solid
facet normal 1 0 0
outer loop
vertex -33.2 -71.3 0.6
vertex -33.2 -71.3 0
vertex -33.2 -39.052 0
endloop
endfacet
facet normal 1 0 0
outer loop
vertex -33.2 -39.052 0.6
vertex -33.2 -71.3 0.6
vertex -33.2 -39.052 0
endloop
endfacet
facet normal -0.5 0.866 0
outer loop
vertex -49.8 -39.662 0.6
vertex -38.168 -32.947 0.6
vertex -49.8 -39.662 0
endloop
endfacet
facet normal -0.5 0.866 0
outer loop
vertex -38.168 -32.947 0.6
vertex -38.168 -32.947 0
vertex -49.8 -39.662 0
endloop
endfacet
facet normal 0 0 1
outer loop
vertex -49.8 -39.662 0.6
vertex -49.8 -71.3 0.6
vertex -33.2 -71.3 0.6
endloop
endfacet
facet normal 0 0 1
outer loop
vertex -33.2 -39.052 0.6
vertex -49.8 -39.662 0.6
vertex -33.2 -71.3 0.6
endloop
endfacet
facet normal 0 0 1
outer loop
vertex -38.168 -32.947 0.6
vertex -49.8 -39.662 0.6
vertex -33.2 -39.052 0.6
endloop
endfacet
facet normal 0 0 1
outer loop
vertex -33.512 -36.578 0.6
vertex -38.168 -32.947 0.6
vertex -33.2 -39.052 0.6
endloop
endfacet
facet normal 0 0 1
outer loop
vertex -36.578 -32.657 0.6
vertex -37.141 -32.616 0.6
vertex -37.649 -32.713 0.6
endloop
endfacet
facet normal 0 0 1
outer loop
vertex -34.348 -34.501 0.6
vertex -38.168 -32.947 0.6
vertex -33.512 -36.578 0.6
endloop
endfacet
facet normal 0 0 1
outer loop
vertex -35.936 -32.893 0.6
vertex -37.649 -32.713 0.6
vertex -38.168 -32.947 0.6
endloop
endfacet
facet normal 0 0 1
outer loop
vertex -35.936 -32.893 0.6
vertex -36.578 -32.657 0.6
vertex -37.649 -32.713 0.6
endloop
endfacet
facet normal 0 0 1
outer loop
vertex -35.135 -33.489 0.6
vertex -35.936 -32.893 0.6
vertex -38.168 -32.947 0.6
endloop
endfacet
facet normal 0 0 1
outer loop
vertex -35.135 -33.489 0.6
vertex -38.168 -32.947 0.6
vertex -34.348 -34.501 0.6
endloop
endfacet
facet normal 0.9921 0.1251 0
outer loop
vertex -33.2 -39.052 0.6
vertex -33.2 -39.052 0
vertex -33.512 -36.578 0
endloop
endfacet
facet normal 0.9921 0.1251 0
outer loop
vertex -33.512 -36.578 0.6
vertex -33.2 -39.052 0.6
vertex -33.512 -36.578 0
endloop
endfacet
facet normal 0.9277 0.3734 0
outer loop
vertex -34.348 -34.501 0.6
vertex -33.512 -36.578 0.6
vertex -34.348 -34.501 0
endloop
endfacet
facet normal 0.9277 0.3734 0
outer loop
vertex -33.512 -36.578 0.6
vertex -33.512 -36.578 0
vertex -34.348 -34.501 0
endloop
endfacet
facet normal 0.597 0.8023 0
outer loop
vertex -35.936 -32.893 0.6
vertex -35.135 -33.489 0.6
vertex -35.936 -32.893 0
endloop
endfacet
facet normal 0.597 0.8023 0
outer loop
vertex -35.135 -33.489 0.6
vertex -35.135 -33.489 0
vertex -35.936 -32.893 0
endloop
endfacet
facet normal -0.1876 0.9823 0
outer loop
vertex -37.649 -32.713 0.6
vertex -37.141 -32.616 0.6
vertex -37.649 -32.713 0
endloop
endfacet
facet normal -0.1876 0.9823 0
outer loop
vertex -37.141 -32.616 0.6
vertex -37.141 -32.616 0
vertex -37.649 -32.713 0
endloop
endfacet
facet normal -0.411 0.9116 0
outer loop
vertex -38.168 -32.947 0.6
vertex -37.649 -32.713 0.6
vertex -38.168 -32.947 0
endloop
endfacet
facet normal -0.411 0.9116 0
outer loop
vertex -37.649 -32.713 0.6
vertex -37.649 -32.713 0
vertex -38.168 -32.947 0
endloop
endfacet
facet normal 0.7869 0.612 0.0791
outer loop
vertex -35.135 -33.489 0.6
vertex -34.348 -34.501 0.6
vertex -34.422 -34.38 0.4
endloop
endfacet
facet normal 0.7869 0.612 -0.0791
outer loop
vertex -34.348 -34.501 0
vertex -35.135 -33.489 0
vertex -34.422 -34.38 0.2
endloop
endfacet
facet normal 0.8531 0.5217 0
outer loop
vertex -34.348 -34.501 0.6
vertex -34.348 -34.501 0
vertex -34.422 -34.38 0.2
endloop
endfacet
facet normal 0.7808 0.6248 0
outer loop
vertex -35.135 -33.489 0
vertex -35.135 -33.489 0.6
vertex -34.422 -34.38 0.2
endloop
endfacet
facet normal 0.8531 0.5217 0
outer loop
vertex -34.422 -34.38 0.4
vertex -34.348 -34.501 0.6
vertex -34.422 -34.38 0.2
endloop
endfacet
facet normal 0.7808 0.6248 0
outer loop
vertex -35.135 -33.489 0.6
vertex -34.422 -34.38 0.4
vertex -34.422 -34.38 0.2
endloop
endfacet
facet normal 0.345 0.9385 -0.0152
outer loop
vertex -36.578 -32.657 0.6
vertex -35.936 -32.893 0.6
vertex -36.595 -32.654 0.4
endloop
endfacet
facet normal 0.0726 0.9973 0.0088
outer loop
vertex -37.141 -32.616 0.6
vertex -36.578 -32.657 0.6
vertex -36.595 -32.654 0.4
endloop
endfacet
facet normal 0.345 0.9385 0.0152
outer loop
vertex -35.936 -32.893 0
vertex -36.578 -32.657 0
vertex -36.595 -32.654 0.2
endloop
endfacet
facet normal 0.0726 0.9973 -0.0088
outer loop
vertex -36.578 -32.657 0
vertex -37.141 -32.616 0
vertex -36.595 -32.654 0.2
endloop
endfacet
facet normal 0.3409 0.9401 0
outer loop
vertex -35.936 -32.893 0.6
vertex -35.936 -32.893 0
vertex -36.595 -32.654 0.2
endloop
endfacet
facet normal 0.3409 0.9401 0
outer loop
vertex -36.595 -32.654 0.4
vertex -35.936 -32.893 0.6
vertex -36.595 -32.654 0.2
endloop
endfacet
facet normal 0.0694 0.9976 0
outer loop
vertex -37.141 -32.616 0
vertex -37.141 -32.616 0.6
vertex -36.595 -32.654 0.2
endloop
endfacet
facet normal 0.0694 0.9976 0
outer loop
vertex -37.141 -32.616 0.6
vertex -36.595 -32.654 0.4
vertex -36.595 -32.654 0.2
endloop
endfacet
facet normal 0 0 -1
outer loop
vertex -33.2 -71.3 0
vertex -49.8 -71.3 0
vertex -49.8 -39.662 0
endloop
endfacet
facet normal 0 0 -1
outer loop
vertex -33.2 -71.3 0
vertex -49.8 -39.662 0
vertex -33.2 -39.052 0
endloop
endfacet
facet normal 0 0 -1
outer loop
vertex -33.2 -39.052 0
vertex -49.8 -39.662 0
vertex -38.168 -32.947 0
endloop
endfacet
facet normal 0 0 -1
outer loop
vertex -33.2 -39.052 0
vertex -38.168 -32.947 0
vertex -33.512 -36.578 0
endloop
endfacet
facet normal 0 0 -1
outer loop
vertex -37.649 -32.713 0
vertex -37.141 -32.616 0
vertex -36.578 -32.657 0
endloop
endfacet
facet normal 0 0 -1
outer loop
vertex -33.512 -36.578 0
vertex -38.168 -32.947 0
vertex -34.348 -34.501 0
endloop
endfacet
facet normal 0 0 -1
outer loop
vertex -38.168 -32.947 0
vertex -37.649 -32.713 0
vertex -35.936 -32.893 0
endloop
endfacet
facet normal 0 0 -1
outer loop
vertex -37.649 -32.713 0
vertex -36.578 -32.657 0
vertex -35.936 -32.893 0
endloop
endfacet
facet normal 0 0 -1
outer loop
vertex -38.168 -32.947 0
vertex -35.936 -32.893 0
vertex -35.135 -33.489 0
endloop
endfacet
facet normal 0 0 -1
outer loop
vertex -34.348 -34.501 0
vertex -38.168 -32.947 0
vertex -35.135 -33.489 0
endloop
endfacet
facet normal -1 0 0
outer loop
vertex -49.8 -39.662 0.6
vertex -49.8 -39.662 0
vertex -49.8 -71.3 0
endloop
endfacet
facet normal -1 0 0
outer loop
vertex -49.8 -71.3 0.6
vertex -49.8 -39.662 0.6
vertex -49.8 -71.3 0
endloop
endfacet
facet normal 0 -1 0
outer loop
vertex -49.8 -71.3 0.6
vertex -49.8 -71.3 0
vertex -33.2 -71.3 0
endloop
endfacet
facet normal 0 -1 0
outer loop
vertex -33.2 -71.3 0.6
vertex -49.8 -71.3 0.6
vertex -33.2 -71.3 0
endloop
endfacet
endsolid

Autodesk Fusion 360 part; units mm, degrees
sketch "Sketch1" plane through (0, 0, 0) normal (0, 0, 1) x (1, 0, 0)
  line L0 (-33, -71.5) -> (-33, -39.0517)
  spline S0 degree 3 poles (-33, -39.0517) (-33, -37.2602) (-33.4854, -35.4836) (-34.2537, -34.2725) (-34.9261, -33.2125) (-35.7722, -32.611) (-36.5563, -32.4575) (-37.1254, -32.346) (-37.6904, -32.44) (-38.2678, -32.7734) knots -1.570796 -1.570796 -1.570796 -1.570796 -0.801145 -0.801145 -0.801145 -0.12753 -0.12753 -0.12753 0.361367 0.361367 0.361367 0.361367
  line L1 (-38.2678, -32.7734) -> (-50, -39.547)
  line L2 (-50, -39.547) -> (-50, -71.5)
  line L3 (-50, -71.5) -> (-33, -71.5)
  line L4 (-33.2, -71.3) -> (-33.2, -39.0517)
  spline S1 degree 3 poles (-33.2, -39.0517) (-33.2, -37.2964) (-33.6813, -35.5482) (-34.4225, -34.3796) (-35.0726, -33.3548) (-35.8807, -32.7936) (-36.5947, -32.6537) (-37.1185, -32.5512) (-37.6252, -32.6333) (-38.1678, -32.9466) knots -1.570796 -1.570796 -1.570796 -1.570796 -0.801145 -0.801145 -0.801145 -0.12753 -0.12753 -0.12753 0.361367 0.361367 0.361367 0.361367
  line L5 (-38.1678, -32.9466) -> (-49.8, -39.6625)
  line L6 (-49.8, -39.6625) -> (-49.8, -71.3)
  line L7 (-49.8, -71.3) -> (-33.2, -71.3)
  dimension "d1" = 17
  dimension "d2" = 71.5
  dimension "d3" = 39.0517
  dimension "d4" = 33
  dimension "d5" = 120
  dimension "d6" = 6.2783
  dimension "d7" = -0.2
extrude "Extrude1" add sketch "Sketch1" along normal blind 0.6 contours L4 S1 L5 L6 L7
